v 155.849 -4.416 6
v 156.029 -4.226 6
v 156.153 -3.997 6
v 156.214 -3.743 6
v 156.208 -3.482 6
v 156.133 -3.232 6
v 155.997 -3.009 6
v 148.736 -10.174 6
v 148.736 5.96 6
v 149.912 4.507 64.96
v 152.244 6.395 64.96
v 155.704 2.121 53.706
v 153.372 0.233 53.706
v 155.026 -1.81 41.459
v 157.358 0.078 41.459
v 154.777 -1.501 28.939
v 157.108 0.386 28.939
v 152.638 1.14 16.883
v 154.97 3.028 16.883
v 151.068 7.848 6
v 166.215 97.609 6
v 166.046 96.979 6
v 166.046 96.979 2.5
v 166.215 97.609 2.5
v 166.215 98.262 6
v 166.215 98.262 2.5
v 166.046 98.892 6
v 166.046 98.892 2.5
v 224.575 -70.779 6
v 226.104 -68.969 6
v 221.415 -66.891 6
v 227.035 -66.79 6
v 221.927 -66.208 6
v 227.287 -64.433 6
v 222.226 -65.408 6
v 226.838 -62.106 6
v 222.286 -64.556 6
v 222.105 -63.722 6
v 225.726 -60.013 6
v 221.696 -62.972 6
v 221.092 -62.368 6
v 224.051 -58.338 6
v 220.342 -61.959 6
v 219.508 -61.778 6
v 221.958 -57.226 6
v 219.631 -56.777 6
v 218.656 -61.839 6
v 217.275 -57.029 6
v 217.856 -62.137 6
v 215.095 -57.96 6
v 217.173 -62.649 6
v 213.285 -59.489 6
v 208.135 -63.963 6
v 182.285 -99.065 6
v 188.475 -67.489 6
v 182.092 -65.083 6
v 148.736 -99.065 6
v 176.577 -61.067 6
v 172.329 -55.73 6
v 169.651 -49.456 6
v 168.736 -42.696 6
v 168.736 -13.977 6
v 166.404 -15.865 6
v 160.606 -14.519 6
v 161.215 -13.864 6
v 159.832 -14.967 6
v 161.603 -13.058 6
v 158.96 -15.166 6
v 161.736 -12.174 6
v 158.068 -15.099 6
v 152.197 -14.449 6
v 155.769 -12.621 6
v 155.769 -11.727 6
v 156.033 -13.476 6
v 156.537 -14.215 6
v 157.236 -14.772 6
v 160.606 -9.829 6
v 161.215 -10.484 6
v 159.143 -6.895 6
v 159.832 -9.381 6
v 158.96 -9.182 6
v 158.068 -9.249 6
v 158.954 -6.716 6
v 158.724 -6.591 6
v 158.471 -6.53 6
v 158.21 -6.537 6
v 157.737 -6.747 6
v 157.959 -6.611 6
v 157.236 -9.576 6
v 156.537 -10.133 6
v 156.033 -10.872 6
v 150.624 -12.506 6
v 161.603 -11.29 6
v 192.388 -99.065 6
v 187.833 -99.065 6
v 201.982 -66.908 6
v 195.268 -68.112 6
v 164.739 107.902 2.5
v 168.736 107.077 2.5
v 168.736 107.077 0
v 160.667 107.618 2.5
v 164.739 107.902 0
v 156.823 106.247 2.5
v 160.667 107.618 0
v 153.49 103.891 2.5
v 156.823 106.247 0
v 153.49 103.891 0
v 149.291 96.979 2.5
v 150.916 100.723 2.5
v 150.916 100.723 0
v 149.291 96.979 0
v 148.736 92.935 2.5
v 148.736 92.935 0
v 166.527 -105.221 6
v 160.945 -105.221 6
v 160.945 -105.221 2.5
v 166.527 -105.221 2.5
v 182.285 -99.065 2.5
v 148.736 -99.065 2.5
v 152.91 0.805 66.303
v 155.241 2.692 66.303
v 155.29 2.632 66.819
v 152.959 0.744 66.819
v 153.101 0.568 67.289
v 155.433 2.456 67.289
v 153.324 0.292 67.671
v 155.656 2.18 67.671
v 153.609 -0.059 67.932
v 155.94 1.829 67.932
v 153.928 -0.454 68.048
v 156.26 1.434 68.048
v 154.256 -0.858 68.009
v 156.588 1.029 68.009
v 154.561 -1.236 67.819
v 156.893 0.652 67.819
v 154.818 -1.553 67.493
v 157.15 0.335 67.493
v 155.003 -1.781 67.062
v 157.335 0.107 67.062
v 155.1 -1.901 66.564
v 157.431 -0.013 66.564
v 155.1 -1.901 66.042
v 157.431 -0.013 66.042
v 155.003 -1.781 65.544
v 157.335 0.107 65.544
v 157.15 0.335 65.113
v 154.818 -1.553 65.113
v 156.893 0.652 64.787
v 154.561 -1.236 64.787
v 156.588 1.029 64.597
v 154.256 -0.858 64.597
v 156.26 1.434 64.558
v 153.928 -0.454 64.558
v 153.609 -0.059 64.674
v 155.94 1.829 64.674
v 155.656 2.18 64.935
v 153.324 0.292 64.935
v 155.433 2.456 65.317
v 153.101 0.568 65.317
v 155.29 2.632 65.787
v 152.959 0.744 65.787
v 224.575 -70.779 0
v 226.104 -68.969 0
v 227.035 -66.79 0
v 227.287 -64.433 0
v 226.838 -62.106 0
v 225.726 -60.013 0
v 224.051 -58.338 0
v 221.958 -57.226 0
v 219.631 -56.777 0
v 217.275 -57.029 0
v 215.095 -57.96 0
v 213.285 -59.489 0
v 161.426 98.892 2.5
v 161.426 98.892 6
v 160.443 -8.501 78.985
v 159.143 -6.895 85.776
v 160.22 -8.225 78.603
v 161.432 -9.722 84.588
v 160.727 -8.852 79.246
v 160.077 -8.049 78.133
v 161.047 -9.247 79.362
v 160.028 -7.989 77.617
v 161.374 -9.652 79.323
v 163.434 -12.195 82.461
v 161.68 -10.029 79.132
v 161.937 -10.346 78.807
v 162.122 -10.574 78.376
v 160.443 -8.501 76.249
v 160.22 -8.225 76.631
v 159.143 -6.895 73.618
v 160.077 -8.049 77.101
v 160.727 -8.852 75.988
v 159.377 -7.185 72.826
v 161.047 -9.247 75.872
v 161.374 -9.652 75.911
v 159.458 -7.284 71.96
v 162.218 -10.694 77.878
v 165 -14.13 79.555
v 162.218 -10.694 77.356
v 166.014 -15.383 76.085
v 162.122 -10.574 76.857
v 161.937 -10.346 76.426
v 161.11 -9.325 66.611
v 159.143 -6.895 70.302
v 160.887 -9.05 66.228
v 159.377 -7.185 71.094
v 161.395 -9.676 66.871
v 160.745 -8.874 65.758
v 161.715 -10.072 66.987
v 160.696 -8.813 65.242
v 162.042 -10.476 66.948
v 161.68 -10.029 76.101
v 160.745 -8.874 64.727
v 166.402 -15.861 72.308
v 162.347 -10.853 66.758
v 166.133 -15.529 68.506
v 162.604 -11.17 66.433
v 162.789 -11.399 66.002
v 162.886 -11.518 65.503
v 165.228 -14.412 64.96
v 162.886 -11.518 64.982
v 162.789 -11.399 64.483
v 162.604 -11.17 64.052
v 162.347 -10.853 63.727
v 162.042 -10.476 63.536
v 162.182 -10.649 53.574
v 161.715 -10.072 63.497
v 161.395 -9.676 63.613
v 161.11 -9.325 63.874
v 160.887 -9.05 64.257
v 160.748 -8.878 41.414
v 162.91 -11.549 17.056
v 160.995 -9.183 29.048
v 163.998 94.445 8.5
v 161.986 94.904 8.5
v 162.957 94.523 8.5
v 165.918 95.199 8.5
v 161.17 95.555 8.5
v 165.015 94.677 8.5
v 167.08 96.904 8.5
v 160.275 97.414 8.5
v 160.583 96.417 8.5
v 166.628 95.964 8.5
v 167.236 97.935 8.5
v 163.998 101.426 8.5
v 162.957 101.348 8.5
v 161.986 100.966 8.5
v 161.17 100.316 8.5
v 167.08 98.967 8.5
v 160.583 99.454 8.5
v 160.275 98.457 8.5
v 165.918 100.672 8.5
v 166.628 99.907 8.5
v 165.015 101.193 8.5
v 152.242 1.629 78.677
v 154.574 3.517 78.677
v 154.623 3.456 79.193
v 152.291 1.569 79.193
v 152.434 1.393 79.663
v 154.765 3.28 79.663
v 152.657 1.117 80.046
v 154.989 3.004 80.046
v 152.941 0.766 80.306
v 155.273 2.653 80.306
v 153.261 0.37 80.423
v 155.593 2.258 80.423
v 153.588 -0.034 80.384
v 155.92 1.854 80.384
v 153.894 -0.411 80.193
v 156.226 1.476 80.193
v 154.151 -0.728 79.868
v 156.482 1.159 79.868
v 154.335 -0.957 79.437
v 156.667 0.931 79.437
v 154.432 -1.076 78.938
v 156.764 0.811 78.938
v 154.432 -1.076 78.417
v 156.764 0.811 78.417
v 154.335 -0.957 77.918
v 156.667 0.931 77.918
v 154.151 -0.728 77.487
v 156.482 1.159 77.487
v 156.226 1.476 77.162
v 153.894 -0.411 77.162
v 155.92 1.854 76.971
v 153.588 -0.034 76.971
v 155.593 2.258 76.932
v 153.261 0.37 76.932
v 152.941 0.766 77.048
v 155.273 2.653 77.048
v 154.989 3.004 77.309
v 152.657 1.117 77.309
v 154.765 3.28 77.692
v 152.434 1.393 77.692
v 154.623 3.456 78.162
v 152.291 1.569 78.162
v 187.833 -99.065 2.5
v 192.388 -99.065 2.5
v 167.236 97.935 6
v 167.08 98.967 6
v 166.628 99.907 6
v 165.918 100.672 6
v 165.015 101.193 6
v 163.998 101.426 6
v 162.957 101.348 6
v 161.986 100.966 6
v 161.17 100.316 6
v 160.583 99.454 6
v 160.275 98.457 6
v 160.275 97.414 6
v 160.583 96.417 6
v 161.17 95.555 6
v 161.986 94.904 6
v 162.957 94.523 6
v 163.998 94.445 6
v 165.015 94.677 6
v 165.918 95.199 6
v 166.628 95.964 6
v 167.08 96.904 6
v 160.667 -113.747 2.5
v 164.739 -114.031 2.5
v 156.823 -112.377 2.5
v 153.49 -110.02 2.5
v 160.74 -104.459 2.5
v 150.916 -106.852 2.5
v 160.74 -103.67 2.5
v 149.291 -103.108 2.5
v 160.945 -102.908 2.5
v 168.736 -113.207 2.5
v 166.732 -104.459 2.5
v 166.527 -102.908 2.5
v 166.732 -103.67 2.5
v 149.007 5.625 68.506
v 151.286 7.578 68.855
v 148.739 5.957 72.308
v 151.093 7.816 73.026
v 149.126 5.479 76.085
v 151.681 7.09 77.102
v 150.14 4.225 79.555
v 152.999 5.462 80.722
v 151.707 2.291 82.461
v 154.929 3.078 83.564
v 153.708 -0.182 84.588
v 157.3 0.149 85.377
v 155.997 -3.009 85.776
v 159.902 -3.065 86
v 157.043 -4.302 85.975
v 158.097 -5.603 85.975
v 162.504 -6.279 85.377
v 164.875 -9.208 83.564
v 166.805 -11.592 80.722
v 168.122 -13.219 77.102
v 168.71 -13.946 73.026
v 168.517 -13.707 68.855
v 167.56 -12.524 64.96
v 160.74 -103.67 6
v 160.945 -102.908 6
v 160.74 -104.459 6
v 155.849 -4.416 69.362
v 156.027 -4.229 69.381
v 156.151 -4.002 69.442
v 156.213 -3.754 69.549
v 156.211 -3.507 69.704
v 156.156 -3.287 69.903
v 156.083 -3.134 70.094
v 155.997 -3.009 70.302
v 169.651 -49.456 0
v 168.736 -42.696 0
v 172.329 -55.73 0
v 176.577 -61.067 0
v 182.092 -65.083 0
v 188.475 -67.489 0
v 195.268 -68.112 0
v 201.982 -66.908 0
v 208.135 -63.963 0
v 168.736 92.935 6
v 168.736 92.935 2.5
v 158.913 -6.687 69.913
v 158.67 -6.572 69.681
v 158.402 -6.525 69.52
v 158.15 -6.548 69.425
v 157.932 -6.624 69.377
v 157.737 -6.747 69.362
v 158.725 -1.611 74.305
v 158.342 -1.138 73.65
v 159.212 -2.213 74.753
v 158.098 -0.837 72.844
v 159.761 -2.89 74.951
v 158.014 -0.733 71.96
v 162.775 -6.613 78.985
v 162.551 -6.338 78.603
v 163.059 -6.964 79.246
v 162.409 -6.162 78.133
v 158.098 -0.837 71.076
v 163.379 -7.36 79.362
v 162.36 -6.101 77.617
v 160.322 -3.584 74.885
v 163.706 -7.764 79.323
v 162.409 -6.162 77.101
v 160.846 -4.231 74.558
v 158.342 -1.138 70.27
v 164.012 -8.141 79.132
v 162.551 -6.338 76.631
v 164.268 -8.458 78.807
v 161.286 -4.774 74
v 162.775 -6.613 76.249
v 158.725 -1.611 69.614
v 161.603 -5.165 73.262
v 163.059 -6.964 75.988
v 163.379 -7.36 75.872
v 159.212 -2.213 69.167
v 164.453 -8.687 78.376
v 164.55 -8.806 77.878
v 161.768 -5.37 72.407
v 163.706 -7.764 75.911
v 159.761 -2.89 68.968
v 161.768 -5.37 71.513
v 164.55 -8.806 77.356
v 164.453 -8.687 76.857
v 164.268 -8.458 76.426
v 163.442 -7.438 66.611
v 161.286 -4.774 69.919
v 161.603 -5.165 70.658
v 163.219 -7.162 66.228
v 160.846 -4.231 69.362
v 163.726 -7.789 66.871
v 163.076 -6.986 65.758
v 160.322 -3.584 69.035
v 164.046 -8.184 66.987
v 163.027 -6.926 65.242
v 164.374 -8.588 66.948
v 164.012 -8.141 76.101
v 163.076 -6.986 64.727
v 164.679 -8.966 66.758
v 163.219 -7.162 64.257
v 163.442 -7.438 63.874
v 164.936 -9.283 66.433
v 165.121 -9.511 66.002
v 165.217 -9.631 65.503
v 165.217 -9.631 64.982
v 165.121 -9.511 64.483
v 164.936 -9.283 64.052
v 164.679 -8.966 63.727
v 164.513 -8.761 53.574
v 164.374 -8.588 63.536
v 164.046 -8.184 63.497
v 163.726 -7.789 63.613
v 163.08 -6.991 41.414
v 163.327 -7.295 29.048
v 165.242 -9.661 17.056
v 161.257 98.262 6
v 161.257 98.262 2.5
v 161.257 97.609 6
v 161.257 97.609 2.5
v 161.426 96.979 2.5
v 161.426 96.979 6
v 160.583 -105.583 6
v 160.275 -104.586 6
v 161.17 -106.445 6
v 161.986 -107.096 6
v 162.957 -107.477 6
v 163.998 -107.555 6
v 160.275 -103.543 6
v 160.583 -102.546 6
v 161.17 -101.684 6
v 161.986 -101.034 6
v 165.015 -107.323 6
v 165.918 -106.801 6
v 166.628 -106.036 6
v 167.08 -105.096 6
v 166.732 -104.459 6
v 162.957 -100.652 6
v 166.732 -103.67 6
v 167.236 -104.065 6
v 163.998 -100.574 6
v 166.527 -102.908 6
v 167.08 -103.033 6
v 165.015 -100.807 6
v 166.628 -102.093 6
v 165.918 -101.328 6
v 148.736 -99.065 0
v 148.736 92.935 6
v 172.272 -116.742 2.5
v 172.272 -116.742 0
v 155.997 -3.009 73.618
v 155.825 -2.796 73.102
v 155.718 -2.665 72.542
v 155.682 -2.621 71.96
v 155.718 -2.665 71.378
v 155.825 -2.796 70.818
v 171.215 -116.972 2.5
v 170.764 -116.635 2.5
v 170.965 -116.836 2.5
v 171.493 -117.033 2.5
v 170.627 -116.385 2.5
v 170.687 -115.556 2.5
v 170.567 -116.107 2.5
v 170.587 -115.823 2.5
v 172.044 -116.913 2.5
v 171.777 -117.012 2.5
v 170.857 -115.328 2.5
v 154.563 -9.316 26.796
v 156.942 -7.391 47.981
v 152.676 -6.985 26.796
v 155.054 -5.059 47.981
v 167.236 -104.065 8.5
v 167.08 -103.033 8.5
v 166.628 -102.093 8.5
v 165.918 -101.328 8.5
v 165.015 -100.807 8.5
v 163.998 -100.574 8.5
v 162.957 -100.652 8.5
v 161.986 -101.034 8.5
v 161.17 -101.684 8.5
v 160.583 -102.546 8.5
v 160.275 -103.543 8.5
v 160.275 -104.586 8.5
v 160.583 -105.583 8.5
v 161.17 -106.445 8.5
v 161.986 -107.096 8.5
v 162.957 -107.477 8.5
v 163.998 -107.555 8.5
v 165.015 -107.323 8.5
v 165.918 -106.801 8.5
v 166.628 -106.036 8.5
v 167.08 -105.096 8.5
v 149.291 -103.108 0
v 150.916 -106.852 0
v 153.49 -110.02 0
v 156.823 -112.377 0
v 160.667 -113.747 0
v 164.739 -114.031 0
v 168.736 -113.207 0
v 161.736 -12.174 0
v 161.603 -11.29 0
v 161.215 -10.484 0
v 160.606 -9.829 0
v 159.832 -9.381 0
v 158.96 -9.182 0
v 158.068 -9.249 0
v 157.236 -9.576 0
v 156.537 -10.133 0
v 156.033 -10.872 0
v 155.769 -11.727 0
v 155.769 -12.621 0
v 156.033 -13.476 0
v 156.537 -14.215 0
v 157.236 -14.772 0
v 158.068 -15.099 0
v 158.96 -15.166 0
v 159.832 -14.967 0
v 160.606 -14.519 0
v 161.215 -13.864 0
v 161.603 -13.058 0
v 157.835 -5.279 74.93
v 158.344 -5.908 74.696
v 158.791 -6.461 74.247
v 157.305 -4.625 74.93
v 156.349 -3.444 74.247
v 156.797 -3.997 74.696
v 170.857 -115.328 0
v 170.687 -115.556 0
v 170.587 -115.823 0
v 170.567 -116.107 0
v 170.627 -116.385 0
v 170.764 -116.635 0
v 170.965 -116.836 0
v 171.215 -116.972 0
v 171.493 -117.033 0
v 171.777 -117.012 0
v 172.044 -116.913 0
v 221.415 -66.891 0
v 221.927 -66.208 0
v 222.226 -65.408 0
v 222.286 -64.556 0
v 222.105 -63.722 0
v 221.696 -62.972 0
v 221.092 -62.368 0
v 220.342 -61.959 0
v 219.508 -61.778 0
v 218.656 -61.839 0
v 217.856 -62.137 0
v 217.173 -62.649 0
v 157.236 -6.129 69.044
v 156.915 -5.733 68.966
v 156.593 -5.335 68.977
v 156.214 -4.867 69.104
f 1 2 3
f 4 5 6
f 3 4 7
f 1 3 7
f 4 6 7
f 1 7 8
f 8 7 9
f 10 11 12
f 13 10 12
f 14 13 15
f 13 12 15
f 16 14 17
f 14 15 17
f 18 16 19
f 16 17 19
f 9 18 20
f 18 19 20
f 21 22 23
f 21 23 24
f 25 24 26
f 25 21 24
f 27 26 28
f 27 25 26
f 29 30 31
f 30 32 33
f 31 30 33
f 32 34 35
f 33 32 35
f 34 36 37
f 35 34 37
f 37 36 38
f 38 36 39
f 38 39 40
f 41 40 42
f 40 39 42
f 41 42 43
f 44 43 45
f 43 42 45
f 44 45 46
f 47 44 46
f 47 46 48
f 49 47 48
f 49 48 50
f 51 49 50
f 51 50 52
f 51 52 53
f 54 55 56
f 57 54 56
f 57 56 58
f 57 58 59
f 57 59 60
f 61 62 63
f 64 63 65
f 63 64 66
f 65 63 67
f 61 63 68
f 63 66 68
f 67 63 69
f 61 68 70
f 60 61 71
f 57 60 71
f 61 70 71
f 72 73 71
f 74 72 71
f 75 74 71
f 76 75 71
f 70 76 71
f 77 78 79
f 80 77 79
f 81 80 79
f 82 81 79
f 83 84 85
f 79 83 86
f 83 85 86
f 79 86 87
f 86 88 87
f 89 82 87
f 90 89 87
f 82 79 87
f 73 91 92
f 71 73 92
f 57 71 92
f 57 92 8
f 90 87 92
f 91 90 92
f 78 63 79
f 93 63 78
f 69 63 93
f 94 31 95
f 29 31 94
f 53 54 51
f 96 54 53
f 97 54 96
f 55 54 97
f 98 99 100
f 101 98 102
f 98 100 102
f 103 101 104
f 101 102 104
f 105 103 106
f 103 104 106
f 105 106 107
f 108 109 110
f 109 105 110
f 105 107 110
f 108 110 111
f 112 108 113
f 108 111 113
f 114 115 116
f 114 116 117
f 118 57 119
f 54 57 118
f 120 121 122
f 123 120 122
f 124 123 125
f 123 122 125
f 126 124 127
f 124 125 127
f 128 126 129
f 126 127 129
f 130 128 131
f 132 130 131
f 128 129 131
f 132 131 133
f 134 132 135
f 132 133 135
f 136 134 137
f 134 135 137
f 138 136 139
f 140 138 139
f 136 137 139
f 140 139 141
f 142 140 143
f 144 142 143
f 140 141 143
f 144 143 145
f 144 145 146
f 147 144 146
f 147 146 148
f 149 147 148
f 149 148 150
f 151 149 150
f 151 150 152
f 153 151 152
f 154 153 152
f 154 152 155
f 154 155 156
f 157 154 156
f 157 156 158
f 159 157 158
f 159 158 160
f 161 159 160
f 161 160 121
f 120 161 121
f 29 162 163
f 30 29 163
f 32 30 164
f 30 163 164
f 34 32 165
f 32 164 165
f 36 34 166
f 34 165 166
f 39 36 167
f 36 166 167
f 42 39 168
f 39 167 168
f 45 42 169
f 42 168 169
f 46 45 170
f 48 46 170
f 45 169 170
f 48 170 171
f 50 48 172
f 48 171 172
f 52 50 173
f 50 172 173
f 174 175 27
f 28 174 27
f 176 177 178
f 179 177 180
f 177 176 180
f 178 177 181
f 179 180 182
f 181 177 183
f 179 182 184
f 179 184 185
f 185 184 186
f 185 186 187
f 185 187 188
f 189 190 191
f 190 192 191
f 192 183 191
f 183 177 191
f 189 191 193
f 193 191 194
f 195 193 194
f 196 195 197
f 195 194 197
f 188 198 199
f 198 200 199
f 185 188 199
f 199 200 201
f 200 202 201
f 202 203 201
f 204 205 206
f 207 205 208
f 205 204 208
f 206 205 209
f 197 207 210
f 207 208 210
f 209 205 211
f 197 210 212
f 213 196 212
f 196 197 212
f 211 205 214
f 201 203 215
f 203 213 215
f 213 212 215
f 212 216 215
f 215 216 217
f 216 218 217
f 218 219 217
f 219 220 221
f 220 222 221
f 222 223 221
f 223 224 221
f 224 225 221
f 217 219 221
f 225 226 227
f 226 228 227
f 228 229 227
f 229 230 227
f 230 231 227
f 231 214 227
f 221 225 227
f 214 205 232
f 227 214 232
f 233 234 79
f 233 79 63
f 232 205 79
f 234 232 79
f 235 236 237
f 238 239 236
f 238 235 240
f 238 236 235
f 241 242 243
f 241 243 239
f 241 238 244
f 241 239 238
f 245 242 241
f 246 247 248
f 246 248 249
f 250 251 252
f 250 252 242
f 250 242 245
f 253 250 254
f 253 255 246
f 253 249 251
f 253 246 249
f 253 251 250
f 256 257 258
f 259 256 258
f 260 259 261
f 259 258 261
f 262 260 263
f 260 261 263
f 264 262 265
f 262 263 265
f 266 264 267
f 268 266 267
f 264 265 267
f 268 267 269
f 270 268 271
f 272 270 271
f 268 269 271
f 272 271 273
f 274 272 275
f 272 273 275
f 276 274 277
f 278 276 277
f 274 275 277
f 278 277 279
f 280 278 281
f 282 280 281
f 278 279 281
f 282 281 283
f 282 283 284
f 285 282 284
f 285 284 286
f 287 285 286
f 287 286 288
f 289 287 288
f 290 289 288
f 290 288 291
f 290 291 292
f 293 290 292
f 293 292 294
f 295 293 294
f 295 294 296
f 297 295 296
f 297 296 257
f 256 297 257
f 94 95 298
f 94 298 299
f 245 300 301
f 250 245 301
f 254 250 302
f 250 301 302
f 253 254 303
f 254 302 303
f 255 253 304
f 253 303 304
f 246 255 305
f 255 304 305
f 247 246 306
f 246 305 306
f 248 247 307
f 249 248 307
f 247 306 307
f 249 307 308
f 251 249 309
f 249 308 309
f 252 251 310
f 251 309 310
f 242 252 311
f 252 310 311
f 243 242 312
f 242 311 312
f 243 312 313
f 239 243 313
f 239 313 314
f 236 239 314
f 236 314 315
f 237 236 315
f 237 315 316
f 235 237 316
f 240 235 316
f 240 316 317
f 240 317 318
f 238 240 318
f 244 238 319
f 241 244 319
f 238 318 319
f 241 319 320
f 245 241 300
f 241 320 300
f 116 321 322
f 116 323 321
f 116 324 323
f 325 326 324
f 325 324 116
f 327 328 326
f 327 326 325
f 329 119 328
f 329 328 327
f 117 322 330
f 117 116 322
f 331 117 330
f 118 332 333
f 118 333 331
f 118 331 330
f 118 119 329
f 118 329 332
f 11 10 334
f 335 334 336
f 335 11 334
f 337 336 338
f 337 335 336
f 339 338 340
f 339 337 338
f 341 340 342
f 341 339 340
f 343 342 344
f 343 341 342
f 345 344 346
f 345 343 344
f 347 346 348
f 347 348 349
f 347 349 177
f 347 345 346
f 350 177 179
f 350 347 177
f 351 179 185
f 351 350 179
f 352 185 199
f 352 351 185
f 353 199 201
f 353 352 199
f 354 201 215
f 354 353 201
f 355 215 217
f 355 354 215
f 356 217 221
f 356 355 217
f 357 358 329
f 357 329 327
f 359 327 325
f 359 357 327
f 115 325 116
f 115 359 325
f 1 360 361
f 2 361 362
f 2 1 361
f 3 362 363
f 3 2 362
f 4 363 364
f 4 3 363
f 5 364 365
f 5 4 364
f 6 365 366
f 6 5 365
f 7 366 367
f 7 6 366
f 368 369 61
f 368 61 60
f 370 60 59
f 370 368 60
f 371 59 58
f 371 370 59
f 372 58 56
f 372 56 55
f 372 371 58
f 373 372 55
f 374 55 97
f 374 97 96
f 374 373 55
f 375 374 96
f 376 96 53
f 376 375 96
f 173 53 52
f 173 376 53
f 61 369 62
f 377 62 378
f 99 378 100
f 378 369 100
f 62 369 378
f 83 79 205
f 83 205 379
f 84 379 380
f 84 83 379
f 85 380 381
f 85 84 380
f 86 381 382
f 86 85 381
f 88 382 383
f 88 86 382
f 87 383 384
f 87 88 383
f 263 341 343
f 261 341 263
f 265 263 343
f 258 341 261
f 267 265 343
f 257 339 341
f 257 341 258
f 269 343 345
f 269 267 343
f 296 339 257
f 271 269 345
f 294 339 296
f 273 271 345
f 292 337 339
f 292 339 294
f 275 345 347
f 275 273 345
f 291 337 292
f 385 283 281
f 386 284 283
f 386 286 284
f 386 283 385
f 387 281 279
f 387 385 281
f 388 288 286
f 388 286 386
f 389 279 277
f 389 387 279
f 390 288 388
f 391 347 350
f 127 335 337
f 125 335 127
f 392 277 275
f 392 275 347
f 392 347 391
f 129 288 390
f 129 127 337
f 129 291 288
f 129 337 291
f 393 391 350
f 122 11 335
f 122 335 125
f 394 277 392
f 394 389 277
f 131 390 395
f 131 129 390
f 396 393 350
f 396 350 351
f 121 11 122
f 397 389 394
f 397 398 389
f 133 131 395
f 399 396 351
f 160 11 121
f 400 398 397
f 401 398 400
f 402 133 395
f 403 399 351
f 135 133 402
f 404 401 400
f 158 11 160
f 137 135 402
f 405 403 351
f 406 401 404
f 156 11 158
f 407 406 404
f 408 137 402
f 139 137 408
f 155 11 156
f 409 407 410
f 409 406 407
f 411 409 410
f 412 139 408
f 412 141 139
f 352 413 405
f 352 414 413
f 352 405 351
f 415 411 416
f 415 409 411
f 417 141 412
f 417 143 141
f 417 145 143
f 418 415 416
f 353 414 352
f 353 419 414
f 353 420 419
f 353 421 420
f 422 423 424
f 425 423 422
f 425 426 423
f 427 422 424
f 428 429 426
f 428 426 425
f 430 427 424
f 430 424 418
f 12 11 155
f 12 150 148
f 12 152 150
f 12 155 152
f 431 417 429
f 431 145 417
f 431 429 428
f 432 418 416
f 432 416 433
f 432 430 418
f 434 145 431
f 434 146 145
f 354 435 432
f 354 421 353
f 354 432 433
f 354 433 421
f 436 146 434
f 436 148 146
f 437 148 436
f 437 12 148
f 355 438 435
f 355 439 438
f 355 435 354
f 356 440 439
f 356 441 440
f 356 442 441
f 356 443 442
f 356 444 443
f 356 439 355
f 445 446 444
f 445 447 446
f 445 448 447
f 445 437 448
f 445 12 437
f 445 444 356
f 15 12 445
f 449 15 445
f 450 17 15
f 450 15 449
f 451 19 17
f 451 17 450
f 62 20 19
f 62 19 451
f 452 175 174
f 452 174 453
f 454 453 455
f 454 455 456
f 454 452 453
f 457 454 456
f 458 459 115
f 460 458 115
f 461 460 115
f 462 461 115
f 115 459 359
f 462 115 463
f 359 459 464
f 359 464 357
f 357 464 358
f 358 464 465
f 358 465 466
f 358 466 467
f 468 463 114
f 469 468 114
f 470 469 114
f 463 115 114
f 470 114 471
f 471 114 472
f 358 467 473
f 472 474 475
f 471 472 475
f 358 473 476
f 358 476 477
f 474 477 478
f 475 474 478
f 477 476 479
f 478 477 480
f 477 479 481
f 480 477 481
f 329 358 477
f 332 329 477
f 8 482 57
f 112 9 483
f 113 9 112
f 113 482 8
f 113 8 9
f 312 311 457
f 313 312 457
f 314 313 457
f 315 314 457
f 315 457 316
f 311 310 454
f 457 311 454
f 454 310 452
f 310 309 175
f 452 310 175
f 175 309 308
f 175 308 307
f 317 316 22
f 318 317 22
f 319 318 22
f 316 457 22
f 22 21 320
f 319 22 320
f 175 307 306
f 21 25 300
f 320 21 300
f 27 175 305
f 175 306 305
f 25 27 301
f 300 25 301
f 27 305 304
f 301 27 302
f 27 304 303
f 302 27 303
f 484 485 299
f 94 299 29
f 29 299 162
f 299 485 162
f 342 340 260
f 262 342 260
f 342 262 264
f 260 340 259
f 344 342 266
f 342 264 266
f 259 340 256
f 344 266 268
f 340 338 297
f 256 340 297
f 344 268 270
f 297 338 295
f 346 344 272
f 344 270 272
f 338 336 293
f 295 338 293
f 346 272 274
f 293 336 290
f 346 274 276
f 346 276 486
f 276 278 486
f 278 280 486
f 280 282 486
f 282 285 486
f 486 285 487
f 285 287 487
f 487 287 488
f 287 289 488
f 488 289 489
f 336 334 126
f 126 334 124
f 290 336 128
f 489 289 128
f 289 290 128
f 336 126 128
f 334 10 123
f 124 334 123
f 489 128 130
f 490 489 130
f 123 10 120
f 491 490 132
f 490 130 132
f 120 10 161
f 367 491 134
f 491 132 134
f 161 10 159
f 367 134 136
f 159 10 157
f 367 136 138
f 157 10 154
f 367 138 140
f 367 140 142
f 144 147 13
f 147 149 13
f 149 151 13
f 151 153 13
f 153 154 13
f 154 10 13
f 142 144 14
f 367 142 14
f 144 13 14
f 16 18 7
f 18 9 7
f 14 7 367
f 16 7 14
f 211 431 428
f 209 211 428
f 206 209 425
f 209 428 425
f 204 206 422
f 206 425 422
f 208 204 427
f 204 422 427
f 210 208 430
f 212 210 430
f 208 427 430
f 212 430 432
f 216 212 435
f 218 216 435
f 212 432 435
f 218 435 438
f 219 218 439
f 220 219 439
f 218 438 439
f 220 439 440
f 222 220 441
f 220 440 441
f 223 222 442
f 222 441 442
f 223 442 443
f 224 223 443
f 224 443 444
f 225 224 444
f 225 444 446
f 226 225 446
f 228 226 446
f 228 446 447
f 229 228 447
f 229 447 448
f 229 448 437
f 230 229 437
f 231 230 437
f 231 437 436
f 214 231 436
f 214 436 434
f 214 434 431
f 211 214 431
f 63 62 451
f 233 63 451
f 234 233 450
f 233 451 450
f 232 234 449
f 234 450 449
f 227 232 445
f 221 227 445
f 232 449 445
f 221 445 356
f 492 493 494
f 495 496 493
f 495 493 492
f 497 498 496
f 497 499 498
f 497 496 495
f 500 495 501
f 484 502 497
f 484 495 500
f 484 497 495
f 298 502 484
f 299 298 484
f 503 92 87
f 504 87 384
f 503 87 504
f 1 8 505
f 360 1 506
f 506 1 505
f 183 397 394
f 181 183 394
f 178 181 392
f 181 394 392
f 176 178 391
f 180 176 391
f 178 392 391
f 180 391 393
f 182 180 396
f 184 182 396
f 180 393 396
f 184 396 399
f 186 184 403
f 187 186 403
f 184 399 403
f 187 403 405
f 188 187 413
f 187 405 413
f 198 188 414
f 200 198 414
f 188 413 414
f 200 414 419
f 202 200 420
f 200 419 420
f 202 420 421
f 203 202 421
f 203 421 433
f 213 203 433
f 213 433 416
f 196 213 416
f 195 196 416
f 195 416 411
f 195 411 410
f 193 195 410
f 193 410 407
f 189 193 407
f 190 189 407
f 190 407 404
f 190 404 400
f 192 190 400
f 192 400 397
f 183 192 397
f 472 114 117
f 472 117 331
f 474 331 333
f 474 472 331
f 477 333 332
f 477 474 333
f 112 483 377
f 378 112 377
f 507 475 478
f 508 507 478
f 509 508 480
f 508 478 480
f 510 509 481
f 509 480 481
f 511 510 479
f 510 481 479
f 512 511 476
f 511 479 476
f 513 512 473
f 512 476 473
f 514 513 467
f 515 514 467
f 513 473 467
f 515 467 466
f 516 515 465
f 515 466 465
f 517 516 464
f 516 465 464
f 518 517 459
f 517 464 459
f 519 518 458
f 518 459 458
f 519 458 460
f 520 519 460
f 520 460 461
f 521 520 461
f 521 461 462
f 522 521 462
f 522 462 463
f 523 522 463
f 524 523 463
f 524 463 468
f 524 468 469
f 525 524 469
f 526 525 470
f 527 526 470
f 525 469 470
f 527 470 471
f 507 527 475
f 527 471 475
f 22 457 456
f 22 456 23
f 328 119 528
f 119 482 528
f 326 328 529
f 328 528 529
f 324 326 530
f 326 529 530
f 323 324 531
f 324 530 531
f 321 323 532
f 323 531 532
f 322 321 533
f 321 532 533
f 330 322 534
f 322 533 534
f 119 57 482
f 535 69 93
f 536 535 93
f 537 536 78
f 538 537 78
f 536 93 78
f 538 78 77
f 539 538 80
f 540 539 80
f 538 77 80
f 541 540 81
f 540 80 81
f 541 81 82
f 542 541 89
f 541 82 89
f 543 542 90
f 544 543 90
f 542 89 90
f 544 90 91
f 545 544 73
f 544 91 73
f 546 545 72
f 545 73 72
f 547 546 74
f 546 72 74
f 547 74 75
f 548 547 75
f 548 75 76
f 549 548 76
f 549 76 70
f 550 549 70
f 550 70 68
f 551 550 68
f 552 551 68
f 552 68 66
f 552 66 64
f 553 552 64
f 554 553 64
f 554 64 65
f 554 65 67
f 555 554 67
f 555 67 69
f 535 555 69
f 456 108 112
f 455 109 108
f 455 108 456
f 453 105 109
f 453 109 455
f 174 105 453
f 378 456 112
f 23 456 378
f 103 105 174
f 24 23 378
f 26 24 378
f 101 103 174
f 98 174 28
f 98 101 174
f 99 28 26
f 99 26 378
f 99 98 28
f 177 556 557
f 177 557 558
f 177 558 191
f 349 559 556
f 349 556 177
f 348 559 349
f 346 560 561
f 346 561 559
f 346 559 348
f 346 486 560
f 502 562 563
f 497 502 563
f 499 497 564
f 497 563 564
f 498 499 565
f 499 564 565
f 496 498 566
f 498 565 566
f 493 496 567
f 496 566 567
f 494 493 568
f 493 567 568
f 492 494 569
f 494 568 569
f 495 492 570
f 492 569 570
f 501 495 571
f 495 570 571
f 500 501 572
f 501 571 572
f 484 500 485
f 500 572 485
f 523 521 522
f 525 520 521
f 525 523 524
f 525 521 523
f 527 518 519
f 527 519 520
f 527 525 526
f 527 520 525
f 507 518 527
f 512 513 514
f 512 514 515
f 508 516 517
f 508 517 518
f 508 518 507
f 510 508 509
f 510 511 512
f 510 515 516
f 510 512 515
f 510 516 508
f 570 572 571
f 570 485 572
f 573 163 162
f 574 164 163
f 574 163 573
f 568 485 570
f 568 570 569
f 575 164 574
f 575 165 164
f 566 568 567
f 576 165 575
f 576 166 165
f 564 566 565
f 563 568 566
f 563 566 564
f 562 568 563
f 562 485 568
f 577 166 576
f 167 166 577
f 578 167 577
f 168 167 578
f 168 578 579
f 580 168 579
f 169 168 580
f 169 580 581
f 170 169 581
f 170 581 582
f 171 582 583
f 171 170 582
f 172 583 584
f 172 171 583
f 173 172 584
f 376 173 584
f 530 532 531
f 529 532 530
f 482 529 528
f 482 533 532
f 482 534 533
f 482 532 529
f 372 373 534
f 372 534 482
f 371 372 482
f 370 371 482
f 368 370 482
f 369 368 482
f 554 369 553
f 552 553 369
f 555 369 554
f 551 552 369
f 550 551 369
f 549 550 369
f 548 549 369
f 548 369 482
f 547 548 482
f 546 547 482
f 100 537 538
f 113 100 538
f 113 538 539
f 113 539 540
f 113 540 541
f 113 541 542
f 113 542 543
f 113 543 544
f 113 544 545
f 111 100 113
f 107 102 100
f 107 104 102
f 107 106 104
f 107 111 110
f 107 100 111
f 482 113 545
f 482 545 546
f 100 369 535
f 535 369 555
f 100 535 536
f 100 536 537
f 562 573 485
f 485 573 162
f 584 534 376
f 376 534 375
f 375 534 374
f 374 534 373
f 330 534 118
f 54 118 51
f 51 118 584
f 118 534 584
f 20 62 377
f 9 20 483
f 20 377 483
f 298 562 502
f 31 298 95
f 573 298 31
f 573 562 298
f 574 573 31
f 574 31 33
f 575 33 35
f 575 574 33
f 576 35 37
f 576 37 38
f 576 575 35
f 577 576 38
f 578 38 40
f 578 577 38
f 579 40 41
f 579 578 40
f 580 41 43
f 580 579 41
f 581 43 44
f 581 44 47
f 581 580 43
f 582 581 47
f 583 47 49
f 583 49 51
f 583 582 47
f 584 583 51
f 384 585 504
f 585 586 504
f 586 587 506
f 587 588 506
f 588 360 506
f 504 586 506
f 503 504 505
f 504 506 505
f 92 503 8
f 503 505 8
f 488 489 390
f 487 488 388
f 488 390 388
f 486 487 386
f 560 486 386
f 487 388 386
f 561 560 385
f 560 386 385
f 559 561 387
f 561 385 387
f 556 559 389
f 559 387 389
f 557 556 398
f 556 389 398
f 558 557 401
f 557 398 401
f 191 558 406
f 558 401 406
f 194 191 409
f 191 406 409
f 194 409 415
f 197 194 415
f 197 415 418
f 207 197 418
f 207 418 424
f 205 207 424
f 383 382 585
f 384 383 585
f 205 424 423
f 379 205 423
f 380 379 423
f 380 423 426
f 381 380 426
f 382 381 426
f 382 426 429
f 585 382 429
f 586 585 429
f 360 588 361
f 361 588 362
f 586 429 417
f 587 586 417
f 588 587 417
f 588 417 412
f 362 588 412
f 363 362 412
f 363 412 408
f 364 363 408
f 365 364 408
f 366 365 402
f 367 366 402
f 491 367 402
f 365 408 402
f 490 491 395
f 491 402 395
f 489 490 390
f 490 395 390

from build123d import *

# Parameters (mm, degrees)
PAD_DEPTH       = 6
SKETCH001_W     = 31.342523
SKETCH001_H     = 18.2690453429
SKETCH001_R     = 2.5
POCKET_DEPTH    = 3.5
SKETCH013_W     = 48.164109
SKETCH013_H     = 19.3260583096
SKETCH013_R     = 3.021402
POCKET008_DEPTH = 3.5
PAD001_DEPTH    = 80
POCKET009_DEPTH = 3
SKETCH015_R     = 3
SKETCH015_R_2   = 1.75
POCKET010_DEPTH = 80.3906309058
POCKET011_DEPTH = 5.5
POCKET012_DEPTH = 3.5
POCKET013_DEPTH = 3.5
SKETCH022_R     = 3.5
PAD002_DEPTH    = 2.5
SKETCH023_R     = 3.5
PAD003_DEPTH    = 2.5
SKETCH024_R     = 3
POCKET014_DEPTH = 6.001


with BuildPart() as part:
    # Sketch → Pad (new body)
    with BuildSketch(Plane.XY):
        with BuildLine():
            Line((148.7359710531, -99.0646793429), (148.7359710531, 92.9353206571))
            ThreePointArc((168.7359710531, 107.0774562808), (155.0757170152, 105.182769371), (148.7359710531, 92.9353206571))
            Line((168.7359710531, -42.6963517772), (168.7359710531, 107.0774562808))
            ThreePointArc((168.7359710531, -42.6963517772), (185.2022873789, -66.5007048599), (213.2847541452, -59.4891530095))
            ThreePointArc((224.5749857013, -70.7793845656), (224.9509601574, -59.1131785534), (213.2847541452, -59.4891530095))
            Line((172.271504959, -116.7423812201), (224.5749857013, -70.7793845656))
            ThreePointArc((170.8572913966, -115.3281676577), (170.8572913966, -116.7423812201), (172.271504959, -116.7423812201))
            Line((170.8572913966, -115.3281676577), (221.4154262515, -66.8913531464))
            ThreePointArc((221.4154262515, -66.8913531464), (221.4154262515, -62.6487124593), (217.1727855643, -62.6487124593))
            Line((168.7359710531, -113.2068473142), (217.1727855643, -62.6487124593))
            ThreePointArc((148.7359710531, -99.0646793429), (155.0757038094, -111.3121510664), (168.7359710531, -113.2068473142))
        make_face()
    extrude(amount=PAD_DEPTH)

    # Sketch001 → Pocket (cut)
    with BuildSketch(Plane.XY.offset(6)):
        with Locations((159.4964165, 102.0698433285)):
            Rectangle(SKETCH001_W, SKETCH001_H)
        with Locations((163.7359710531, 97.9353206571)):
            Circle(SKETCH001_R, mode=Mode.SUBTRACT)
    extrude(amount=-POCKET_DEPTH, mode=Mode.SUBTRACT)

    # Sketch013 → Pocket008 (cut)
    with BuildSketch(Plane.XY.offset(6)):
        with Locations((169.3588635, -108.7277408452)):
            Rectangle(SKETCH013_W, SKETCH013_H)
        with Locations((163.7359710531, -104.0647116904)):
            Circle(SKETCH013_R, mode=Mode.SUBTRACT)
    extrude(amount=-POCKET008_DEPTH, mode=Mode.SUBTRACT)

    # Sketch014 → Pad001 (new body)
    with BuildSketch(Plane.XY.offset(6)):
        with BuildLine():
            Line((148.7359710531, 5.9602104844), (155.9970967848, -3.0092063605))
            ThreePointArc((155.849066174, -4.4156511472), (156.2143657321, -3.7430868972), (155.9970967848, -3.0092063605))
            Line((148.7359710531, -10.174005219), (155.849066174, -4.4156511472))
            Line((148.7359710531, -10.174005219), (150.6235923171, -12.5057183154))
            Line((150.6235923171, -12.5057183154), (157.7366874381, -6.7473642436))
            ThreePointArc((159.1431322249, -6.8953948544), (158.4705679748, -6.5300952963), (157.7366874381, -6.7473642436))
            Line((159.1431322249, -6.8953948544), (166.4042579566, -15.8648116991))
            Line((166.4042579566, -15.8648116991), (168.7359710531, -13.9771904352))
            Line((151.0676841499, 7.8478317492), (168.7359710531, -13.9771904352))
            Line((148.7359710531, 5.9602104844), (151.0676841499, 7.8478317492))
        make_face()
    extrude(amount=PAD001_DEPTH)

    # Sketch016 → Pocket009 (cut)
    with BuildSketch(Plane(origin=(95.0976832559, 76.9856331596, 0), x_dir=(-0.629207088, 0.7772376988, 0), z_dir=(0.7772376988, 0.629207088, 0))):
        with BuildLine():
            ThreePointArc((-90.8226866435, 64.9598793146), (-102.9933476305, 86), (-115.1640086175, 64.9598793146))
            ThreePointArc((-117.0334683159, 6), (-107.9048310085, 35.2201328201), (-115.1640086175, 64.9598793146))
            Line((-117.0334683159, 6), (-129.946838, 10.190964))
            Line((-129.946838, 10.190964), (-129.946838, 98.716408))
            Line((-129.946838, 98.716408), (-69.304048, 98.716408))
            Line((-69.304048, 98.716408), (-45.866948, 9.880296))
            Line((-45.866948, 9.880296), (-88.9532269451, 6))
            ThreePointArc((-90.8226866435, 64.9598793146), (-99.1328607178, 35.18680854), (-88.9532269451, 6))
        make_face()
    extrude(amount=-POCKET009_DEPTH, mode=Mode.SUBTRACT)

    # Sketch015 → Pocket010 (cut, through all)
    with BuildSketch(Plane(origin=(95.0976832559, 76.9856331596, 0), x_dir=(-0.629207088, 0.7772376988, 0), z_dir=(0.7772376988, 0.629207088, 0))):
        with Locations((-102.9933476305, 71.9598793146)):
            Circle(SKETCH015_R)
        with Locations((-96.2758332092, 78.6773937359)):
            Circle(SKETCH015_R_2)
        with Locations((-108.65020188, 77.6167335641)):
            Circle(SKETCH015_R_2)
        with Locations((-109.7108620518, 65.2423648933)):
            Circle(SKETCH015_R_2)
        with Locations((-97.336493381, 66.3030250651)):
            Circle(SKETCH015_R_2)
    extrude(amount=-POCKET010_DEPTH, mode=Mode.SUBTRACT)

    # Sketch017 → Pocket011 (cut, symmetric)
    with BuildSketch(Plane(origin=(63.8603337123, -78.8844559543, 0), x_dir=(-0.7772376988, -0.629207088, 0), z_dir=(-0.629207088, 0.7772376988, 0))):
        with BuildLine():
            ThreePointArc((-118.353410552, 69.3618031032), (-116.0536600062, 37.3521449631), (-109.2016476719, 6.0000000001))
            Line((-98.802281, 97.315555), (-109.2016476718, 6))
            Line((-119.353410552, 97.315555), (-98.802281, 97.315555))
            Line((-119.353410552, 73.6181917099), (-119.353410552, 97.315555))
            Line((-118.353410552, 69.3618031032), (-119.353410552, 73.6181917099))
        make_face()
    extrude(amount=POCKET011_DEPTH, both=True, mode=Mode.SUBTRACT)

    # Sketch020 → Pocket012 (cut)
    with BuildSketch(Plane.XY.offset(6)):
        with BuildLine():
            ThreePointArc((166.0456698843, 98.892029238), (163.7359710531, 100.4353206571), (161.4262722218, 98.892029238))
            Line((161.4262722218, 98.892029238), (166.0456698843, 98.892029238))
        make_face()
        with BuildLine():
            ThreePointArc((161.4262722218, 96.9786120762), (163.7359710531, 95.4353206571), (166.0456698843, 96.9786120762))
            Line((161.4262722218, 96.9786120762), (166.0456698843, 96.9786120762))
        make_face()
    extrude(amount=-POCKET012_DEPTH, mode=Mode.SUBTRACT)

    # Sketch021 → Pocket013 (cut)
    with BuildSketch(Plane.XY.offset(6)):
        with BuildLine():
            ThreePointArc((166.5273825204, -102.9084712025), (163.7359710531, -101.0433096904), (160.9445595858, -102.9084712025))
            Line((160.9445595858, -102.9084712025), (166.5273825204, -102.9084712025))
        make_face()
        with BuildLine():
            ThreePointArc((160.9445595858, -105.2209521783), (163.7359710531, -107.0861136904), (166.5273825204, -105.2209521783))
            Line((160.9445595858, -105.2209521783), (166.5273825204, -105.2209521783))
        make_face()
    extrude(amount=-POCKET013_DEPTH, mode=Mode.SUBTRACT)

    # Sketch022 → Pad002 (new body)
    with BuildSketch(Plane.XY.offset(6)):
        with Locations((163.7359710531, 97.9353206571)):
            Circle(SKETCH022_R)
    extrude(amount=PAD002_DEPTH)

    # Sketch023 → Pad003 (new body)
    with BuildSketch(Plane.XY.offset(6)):
        with Locations((163.7359710531, -104.0647116904)):
            Circle(SKETCH023_R)
    extrude(amount=PAD003_DEPTH)

    # Sketch024 → Pocket014 (cut, through all)
    with BuildSketch(Plane.XY.offset(6)):
        with Locations((158.7359710531, -12.174005219)):
            Circle(SKETCH024_R)
    extrude(amount=-POCKET014_DEPTH, mode=Mode.SUBTRACT)


solid = part.part
